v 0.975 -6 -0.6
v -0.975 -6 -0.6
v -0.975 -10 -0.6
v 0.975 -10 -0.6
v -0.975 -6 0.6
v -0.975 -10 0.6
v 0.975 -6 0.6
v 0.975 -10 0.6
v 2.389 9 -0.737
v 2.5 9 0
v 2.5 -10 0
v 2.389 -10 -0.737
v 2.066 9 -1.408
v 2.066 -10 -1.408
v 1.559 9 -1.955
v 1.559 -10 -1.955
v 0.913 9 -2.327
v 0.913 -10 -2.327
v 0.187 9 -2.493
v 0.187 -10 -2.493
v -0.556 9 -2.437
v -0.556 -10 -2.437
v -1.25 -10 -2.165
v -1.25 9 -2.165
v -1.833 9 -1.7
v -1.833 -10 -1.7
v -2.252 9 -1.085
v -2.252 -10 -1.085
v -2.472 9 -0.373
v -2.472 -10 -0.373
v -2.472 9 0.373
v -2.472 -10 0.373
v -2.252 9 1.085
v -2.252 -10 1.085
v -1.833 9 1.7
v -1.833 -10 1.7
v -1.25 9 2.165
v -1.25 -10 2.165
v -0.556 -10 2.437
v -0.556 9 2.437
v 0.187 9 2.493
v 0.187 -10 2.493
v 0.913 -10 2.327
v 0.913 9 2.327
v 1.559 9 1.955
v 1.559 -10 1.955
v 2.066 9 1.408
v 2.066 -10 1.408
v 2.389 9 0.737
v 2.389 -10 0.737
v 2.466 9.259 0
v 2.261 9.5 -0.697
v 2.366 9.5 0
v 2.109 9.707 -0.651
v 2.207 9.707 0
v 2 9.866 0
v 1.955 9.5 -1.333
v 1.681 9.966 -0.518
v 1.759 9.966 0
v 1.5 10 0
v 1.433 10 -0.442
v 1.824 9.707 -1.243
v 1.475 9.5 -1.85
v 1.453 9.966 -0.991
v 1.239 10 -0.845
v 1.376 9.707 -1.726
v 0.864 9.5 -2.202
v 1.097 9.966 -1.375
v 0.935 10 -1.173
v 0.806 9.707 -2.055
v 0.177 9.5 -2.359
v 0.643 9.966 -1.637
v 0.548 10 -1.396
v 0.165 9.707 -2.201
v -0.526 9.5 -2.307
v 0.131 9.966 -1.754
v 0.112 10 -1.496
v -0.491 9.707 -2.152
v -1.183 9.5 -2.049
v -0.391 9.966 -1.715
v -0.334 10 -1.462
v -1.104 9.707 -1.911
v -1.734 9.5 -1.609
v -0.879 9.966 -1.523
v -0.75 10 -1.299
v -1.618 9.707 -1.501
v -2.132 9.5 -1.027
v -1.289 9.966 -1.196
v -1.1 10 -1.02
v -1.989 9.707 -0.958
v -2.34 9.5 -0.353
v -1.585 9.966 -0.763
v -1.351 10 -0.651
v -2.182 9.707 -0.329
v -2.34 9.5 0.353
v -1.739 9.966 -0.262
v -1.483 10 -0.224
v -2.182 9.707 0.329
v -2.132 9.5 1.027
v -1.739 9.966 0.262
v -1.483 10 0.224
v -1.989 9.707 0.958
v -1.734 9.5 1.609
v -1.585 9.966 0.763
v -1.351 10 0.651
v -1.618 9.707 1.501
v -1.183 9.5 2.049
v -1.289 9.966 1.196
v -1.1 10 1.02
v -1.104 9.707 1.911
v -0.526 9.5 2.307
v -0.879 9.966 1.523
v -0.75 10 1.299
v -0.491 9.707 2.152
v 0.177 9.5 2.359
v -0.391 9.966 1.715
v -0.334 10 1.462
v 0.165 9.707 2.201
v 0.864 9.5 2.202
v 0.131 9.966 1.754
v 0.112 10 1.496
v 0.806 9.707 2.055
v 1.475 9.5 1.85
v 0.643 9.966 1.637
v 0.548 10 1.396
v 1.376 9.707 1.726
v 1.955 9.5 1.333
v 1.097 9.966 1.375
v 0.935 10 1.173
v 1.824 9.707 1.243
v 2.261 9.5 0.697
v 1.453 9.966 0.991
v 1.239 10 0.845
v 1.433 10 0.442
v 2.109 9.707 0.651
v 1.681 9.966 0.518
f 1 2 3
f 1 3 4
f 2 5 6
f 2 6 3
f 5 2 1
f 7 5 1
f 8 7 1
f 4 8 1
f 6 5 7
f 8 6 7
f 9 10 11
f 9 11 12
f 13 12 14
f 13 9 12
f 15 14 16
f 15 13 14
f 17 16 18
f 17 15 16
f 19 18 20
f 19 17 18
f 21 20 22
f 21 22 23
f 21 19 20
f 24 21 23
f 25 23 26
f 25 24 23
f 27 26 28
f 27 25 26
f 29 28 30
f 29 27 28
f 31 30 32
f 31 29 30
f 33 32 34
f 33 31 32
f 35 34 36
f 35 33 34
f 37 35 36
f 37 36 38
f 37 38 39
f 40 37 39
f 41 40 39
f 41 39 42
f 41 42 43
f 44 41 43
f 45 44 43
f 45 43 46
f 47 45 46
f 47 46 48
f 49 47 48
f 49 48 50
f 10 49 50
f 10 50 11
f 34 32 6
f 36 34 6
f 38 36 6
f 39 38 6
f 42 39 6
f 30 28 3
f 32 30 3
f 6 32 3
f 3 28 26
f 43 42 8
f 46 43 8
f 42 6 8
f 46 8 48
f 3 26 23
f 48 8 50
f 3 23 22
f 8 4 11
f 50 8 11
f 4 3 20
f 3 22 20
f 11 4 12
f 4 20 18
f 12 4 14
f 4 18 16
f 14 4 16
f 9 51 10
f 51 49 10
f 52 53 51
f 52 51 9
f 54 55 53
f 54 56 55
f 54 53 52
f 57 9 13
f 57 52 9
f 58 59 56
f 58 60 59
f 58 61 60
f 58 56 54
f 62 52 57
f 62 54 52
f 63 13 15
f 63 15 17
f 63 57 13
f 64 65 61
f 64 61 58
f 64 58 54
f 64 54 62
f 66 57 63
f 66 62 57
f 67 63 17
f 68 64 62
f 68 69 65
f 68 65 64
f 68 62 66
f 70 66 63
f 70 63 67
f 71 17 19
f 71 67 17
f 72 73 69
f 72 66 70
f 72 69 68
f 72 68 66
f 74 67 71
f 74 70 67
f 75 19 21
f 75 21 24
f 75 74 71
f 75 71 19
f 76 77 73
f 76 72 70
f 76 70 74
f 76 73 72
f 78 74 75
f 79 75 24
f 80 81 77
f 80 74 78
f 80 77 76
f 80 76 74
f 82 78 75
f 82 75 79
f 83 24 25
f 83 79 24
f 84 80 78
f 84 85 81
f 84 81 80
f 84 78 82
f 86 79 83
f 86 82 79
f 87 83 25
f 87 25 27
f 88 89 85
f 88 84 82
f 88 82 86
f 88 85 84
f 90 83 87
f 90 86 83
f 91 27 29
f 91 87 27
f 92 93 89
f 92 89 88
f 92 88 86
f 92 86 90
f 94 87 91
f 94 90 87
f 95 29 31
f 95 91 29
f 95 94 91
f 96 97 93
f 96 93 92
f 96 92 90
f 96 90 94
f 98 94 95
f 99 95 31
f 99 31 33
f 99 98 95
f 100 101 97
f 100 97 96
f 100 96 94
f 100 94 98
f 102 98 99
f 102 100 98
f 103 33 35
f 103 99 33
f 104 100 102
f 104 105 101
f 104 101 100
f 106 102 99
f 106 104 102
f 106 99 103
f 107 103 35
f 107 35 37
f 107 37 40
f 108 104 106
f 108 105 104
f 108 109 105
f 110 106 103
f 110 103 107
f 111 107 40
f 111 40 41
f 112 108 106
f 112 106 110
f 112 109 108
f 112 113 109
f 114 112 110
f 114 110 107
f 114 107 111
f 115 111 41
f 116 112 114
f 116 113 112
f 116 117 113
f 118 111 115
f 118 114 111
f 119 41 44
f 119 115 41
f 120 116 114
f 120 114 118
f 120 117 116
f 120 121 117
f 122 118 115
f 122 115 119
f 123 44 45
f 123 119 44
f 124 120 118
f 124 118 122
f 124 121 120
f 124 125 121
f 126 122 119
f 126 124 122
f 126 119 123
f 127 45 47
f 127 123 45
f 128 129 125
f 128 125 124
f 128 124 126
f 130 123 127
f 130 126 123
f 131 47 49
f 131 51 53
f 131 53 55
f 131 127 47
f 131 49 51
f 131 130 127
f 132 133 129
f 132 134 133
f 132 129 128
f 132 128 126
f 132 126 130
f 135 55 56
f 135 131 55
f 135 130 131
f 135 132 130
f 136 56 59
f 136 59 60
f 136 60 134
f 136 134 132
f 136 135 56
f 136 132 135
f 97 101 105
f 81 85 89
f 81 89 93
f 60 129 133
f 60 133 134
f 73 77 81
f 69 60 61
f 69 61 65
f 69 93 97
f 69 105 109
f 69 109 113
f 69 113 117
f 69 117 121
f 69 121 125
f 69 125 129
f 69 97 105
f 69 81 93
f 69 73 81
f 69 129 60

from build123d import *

# Parameters (mm, degrees)
SKETCH2_R           = 2.5
SKETCH2_W           = 1.95
SKETCH2_H           = 1.2
BOSS_EXTRUDE1_DEPTH = 10
FILLET1_R           = 1
SKETCH3_W           = 1.95
SKETCH3_H           = 1.2
BOSS_EXTRUDE5_DEPTH = 16


with BuildPart() as part:
    # Sketch2 → Boss-Extrude1 (new body, symmetric)
    with BuildSketch(Plane(origin=(0, 0, 0), x_dir=(1, 0, 0), z_dir=(0, 1, 0))):
        Circle(SKETCH2_R)
        Rectangle(SKETCH2_W, SKETCH2_H, mode=Mode.SUBTRACT)
    extrude(amount=BOSS_EXTRUDE1_DEPTH, both=True)

    # Fillet1
    fillet1_edges = [part.edges().sort_by_distance(p)[0] for p in [
        (-2.5, 10, 0),
    ]]
    fillet(fillet1_edges, radius=FILLET1_R)

    # Sketch3 → Boss-Extrude5 (add)
    with BuildSketch(Plane(origin=(0, 10, 0), x_dir=(1, 0, 0), z_dir=(0, 1, 0))):
        Rectangle(SKETCH3_W, SKETCH3_H)
    extrude(amount=-BOSS_EXTRUDE5_DEPTH)


solid = part.part
